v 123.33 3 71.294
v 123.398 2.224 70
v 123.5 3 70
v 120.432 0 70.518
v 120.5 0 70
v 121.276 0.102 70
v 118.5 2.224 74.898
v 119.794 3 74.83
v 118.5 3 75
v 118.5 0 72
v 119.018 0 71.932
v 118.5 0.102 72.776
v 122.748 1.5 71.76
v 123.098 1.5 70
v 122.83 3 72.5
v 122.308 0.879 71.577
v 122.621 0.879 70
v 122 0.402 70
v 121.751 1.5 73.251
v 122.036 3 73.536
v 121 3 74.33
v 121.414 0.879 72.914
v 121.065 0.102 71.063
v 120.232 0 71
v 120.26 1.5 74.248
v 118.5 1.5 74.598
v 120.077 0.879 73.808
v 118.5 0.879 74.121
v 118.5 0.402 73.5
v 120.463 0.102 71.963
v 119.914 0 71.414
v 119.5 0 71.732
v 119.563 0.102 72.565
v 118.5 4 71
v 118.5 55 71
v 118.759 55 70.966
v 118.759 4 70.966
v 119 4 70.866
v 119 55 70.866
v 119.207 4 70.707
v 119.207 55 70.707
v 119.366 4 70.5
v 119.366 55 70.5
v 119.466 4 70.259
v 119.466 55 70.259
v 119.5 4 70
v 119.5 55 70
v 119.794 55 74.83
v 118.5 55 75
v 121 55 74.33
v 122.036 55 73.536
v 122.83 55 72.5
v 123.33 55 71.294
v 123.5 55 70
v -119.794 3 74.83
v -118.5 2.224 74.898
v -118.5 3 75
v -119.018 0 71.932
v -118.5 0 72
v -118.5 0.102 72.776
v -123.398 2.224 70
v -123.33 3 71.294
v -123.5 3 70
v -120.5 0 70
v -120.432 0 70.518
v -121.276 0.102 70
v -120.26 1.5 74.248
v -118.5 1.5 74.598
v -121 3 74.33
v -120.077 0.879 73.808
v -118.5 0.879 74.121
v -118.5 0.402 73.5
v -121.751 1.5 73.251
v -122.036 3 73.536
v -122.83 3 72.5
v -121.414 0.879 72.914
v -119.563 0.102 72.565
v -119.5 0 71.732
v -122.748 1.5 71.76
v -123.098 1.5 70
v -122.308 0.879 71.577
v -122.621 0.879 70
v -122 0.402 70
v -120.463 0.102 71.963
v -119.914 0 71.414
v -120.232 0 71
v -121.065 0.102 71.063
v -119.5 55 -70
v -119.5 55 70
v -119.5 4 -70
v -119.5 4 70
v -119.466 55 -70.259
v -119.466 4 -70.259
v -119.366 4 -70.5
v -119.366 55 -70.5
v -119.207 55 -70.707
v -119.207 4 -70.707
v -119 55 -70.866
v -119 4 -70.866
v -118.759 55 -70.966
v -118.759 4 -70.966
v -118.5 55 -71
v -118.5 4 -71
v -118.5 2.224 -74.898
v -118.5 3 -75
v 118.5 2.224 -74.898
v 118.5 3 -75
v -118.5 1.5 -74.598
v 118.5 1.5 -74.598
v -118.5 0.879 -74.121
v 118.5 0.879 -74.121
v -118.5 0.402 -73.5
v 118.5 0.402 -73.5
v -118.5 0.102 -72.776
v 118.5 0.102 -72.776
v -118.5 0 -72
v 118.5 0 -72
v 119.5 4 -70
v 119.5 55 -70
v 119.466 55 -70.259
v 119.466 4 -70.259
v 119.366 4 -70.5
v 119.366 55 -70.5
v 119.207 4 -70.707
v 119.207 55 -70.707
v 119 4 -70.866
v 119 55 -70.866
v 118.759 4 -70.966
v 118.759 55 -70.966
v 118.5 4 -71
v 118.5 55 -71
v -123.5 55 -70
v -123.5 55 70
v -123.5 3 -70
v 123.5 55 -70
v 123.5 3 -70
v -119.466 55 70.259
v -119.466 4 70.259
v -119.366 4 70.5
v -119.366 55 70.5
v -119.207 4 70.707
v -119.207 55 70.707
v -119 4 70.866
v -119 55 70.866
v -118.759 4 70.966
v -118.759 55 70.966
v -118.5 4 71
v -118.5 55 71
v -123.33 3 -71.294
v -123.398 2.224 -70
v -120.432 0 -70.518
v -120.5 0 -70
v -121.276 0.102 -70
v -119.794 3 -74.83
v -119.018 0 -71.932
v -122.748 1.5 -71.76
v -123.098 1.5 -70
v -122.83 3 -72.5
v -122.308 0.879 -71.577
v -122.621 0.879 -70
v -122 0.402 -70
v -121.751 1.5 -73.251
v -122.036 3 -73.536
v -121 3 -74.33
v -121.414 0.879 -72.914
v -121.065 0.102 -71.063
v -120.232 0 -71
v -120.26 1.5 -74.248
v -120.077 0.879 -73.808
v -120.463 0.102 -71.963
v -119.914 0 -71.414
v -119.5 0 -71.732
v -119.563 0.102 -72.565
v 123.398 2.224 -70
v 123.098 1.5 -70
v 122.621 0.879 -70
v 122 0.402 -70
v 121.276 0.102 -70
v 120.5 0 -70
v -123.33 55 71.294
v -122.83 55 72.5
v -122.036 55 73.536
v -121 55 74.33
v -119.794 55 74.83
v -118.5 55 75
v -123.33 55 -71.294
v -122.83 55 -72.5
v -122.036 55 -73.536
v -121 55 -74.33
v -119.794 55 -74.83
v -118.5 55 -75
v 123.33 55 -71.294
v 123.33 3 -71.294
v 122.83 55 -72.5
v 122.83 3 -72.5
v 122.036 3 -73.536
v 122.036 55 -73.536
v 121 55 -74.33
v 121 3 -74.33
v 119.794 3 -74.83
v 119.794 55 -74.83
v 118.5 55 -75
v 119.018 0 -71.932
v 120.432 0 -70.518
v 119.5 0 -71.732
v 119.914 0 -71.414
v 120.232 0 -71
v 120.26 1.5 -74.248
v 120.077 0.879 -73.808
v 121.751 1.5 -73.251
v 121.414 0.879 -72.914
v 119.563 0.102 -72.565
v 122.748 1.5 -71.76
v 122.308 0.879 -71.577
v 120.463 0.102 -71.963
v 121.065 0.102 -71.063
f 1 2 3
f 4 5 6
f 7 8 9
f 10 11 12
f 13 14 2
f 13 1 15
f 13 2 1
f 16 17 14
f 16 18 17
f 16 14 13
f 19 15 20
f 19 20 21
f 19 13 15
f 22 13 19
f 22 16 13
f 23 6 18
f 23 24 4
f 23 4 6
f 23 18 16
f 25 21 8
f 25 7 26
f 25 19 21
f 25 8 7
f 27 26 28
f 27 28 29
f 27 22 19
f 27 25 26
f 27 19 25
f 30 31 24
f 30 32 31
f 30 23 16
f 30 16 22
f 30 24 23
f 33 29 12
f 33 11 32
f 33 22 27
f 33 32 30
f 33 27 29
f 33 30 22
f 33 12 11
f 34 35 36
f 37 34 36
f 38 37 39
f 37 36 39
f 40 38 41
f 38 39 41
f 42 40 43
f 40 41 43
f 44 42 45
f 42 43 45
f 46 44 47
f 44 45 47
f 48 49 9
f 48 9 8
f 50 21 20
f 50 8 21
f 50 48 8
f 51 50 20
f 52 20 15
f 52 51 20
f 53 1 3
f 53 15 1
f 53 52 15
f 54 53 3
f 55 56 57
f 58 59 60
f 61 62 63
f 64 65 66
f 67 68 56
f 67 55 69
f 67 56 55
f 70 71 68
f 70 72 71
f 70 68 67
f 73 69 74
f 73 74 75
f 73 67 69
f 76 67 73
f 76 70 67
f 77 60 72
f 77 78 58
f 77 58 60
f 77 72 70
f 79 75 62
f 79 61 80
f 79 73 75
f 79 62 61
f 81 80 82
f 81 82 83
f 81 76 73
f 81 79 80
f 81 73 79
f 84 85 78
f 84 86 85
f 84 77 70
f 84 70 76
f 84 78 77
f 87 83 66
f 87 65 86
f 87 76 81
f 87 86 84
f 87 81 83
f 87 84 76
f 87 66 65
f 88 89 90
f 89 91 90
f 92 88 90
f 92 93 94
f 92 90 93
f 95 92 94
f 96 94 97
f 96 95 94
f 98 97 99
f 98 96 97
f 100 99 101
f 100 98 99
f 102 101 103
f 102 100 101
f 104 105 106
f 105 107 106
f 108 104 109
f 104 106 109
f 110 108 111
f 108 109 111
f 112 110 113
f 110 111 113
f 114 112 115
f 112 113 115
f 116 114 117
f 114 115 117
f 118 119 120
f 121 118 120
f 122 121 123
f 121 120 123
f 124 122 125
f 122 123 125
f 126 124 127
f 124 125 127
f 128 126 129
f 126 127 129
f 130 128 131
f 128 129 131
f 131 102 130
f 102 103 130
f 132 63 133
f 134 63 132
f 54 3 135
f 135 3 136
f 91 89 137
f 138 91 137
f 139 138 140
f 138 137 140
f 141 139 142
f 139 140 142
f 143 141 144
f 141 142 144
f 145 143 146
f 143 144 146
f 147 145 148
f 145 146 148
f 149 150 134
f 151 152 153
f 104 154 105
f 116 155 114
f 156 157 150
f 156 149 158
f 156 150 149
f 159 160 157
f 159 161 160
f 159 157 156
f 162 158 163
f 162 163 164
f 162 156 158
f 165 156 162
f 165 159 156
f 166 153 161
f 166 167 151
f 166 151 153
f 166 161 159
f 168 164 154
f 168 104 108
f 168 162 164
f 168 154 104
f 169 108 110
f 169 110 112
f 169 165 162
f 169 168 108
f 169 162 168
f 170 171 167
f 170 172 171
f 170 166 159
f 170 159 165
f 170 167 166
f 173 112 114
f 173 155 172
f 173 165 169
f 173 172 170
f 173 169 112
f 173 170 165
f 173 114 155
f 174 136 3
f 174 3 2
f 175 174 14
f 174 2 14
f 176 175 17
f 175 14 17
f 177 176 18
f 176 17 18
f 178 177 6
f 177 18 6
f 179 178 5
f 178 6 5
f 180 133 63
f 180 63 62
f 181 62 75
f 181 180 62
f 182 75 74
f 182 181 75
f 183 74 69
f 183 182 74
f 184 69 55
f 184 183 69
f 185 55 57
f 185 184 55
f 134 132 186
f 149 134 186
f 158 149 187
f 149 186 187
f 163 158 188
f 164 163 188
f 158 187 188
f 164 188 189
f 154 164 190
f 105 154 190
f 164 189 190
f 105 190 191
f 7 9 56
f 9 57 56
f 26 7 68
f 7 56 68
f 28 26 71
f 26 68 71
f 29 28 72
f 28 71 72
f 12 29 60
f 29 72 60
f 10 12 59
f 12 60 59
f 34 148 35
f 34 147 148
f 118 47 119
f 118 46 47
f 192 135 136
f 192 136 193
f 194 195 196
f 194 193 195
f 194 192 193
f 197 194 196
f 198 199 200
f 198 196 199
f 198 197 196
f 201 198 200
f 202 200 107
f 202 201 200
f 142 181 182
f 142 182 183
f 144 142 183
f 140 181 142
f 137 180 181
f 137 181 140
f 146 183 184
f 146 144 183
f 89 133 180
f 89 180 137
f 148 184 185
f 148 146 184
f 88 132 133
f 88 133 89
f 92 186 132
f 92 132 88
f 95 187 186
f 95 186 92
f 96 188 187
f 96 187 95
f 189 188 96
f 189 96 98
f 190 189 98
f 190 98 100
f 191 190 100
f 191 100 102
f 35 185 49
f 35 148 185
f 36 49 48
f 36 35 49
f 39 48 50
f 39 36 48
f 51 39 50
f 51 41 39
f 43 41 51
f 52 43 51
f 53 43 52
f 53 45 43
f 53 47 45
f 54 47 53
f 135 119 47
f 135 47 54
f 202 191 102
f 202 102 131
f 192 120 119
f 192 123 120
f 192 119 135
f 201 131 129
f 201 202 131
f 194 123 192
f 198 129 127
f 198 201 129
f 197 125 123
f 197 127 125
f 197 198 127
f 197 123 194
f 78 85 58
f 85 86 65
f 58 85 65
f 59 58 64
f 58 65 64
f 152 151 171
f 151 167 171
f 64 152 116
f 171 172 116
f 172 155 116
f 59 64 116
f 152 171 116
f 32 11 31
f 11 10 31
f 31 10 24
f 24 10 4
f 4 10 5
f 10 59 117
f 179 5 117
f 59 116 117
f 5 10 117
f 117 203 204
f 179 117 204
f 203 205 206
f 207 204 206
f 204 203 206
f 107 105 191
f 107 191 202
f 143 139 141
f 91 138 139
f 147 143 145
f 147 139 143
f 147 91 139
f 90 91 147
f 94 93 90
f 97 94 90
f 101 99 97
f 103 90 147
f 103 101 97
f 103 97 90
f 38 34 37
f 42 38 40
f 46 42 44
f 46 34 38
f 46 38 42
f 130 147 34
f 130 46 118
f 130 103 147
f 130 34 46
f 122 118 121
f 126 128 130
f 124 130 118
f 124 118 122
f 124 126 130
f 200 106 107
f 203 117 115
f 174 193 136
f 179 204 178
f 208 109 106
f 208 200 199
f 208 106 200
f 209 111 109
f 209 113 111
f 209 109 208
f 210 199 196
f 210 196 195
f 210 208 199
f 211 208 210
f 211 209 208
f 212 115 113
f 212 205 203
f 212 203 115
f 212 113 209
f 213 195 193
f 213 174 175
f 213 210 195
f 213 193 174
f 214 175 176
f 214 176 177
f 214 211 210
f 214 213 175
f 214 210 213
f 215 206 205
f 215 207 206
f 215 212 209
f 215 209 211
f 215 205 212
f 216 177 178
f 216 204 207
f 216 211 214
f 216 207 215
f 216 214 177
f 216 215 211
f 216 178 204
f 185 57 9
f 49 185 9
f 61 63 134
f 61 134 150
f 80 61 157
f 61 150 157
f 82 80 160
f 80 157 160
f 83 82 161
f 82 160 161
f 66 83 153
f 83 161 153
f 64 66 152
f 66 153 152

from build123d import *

# Parameters (mm, degrees)
ESBO_O1_W                = 247
ESBO_O1_H                = 150
RESSALTO_EXTRUS_O1_DEPTH = 55
FILETE1_R                = 5
FILETE2_R                = 3
CASCA1_T                 = -4


with BuildPart() as part:
    # Esboço1 → Ressalto-extrusão1 (new body)
    with BuildSketch(Plane(origin=(0, 0, 0), x_dir=(1, 0, 0), z_dir=(0, 1, 0))):
        Rectangle(ESBO_O1_W, ESBO_O1_H)
    extrude(amount=RESSALTO_EXTRUS_O1_DEPTH)

    # Filete1
    filete1_edges = [part.edges().sort_by_distance(p)[0] for p in [
        (123.5, 27.5, 75),
        (-123.5, 27.5, 75),
        (-123.5, 27.5, -75),
        (123.5, 27.5, -75),
    ]]
    fillet(filete1_edges, radius=FILETE1_R)

    # Filete2
    filete2_edges = [part.edges().sort_by_distance(p)[0] for p in [
        (-123.5, 0, 0),
        (123.5, 0, 0),
        (0, 0, 75),
        (0, 0, -75),
        (122.035533906, 0, 73.535533906),
        (122.035533906, 0, -73.535533906),
        (-122.035533906, 0, 73.535533906),
        (-122.035533906, 0, -73.535533906),
    ]]
    fillet(filete2_edges, radius=FILETE2_R)

    # Casca1
    casca1_openings = [part.faces().sort_by_distance(p)[0] for p in [
        (0, 55, 0),
    ]]
    offset(amount=CASCA1_T, openings=casca1_openings, kind=Kind.INTERSECTION)


solid = part.part
